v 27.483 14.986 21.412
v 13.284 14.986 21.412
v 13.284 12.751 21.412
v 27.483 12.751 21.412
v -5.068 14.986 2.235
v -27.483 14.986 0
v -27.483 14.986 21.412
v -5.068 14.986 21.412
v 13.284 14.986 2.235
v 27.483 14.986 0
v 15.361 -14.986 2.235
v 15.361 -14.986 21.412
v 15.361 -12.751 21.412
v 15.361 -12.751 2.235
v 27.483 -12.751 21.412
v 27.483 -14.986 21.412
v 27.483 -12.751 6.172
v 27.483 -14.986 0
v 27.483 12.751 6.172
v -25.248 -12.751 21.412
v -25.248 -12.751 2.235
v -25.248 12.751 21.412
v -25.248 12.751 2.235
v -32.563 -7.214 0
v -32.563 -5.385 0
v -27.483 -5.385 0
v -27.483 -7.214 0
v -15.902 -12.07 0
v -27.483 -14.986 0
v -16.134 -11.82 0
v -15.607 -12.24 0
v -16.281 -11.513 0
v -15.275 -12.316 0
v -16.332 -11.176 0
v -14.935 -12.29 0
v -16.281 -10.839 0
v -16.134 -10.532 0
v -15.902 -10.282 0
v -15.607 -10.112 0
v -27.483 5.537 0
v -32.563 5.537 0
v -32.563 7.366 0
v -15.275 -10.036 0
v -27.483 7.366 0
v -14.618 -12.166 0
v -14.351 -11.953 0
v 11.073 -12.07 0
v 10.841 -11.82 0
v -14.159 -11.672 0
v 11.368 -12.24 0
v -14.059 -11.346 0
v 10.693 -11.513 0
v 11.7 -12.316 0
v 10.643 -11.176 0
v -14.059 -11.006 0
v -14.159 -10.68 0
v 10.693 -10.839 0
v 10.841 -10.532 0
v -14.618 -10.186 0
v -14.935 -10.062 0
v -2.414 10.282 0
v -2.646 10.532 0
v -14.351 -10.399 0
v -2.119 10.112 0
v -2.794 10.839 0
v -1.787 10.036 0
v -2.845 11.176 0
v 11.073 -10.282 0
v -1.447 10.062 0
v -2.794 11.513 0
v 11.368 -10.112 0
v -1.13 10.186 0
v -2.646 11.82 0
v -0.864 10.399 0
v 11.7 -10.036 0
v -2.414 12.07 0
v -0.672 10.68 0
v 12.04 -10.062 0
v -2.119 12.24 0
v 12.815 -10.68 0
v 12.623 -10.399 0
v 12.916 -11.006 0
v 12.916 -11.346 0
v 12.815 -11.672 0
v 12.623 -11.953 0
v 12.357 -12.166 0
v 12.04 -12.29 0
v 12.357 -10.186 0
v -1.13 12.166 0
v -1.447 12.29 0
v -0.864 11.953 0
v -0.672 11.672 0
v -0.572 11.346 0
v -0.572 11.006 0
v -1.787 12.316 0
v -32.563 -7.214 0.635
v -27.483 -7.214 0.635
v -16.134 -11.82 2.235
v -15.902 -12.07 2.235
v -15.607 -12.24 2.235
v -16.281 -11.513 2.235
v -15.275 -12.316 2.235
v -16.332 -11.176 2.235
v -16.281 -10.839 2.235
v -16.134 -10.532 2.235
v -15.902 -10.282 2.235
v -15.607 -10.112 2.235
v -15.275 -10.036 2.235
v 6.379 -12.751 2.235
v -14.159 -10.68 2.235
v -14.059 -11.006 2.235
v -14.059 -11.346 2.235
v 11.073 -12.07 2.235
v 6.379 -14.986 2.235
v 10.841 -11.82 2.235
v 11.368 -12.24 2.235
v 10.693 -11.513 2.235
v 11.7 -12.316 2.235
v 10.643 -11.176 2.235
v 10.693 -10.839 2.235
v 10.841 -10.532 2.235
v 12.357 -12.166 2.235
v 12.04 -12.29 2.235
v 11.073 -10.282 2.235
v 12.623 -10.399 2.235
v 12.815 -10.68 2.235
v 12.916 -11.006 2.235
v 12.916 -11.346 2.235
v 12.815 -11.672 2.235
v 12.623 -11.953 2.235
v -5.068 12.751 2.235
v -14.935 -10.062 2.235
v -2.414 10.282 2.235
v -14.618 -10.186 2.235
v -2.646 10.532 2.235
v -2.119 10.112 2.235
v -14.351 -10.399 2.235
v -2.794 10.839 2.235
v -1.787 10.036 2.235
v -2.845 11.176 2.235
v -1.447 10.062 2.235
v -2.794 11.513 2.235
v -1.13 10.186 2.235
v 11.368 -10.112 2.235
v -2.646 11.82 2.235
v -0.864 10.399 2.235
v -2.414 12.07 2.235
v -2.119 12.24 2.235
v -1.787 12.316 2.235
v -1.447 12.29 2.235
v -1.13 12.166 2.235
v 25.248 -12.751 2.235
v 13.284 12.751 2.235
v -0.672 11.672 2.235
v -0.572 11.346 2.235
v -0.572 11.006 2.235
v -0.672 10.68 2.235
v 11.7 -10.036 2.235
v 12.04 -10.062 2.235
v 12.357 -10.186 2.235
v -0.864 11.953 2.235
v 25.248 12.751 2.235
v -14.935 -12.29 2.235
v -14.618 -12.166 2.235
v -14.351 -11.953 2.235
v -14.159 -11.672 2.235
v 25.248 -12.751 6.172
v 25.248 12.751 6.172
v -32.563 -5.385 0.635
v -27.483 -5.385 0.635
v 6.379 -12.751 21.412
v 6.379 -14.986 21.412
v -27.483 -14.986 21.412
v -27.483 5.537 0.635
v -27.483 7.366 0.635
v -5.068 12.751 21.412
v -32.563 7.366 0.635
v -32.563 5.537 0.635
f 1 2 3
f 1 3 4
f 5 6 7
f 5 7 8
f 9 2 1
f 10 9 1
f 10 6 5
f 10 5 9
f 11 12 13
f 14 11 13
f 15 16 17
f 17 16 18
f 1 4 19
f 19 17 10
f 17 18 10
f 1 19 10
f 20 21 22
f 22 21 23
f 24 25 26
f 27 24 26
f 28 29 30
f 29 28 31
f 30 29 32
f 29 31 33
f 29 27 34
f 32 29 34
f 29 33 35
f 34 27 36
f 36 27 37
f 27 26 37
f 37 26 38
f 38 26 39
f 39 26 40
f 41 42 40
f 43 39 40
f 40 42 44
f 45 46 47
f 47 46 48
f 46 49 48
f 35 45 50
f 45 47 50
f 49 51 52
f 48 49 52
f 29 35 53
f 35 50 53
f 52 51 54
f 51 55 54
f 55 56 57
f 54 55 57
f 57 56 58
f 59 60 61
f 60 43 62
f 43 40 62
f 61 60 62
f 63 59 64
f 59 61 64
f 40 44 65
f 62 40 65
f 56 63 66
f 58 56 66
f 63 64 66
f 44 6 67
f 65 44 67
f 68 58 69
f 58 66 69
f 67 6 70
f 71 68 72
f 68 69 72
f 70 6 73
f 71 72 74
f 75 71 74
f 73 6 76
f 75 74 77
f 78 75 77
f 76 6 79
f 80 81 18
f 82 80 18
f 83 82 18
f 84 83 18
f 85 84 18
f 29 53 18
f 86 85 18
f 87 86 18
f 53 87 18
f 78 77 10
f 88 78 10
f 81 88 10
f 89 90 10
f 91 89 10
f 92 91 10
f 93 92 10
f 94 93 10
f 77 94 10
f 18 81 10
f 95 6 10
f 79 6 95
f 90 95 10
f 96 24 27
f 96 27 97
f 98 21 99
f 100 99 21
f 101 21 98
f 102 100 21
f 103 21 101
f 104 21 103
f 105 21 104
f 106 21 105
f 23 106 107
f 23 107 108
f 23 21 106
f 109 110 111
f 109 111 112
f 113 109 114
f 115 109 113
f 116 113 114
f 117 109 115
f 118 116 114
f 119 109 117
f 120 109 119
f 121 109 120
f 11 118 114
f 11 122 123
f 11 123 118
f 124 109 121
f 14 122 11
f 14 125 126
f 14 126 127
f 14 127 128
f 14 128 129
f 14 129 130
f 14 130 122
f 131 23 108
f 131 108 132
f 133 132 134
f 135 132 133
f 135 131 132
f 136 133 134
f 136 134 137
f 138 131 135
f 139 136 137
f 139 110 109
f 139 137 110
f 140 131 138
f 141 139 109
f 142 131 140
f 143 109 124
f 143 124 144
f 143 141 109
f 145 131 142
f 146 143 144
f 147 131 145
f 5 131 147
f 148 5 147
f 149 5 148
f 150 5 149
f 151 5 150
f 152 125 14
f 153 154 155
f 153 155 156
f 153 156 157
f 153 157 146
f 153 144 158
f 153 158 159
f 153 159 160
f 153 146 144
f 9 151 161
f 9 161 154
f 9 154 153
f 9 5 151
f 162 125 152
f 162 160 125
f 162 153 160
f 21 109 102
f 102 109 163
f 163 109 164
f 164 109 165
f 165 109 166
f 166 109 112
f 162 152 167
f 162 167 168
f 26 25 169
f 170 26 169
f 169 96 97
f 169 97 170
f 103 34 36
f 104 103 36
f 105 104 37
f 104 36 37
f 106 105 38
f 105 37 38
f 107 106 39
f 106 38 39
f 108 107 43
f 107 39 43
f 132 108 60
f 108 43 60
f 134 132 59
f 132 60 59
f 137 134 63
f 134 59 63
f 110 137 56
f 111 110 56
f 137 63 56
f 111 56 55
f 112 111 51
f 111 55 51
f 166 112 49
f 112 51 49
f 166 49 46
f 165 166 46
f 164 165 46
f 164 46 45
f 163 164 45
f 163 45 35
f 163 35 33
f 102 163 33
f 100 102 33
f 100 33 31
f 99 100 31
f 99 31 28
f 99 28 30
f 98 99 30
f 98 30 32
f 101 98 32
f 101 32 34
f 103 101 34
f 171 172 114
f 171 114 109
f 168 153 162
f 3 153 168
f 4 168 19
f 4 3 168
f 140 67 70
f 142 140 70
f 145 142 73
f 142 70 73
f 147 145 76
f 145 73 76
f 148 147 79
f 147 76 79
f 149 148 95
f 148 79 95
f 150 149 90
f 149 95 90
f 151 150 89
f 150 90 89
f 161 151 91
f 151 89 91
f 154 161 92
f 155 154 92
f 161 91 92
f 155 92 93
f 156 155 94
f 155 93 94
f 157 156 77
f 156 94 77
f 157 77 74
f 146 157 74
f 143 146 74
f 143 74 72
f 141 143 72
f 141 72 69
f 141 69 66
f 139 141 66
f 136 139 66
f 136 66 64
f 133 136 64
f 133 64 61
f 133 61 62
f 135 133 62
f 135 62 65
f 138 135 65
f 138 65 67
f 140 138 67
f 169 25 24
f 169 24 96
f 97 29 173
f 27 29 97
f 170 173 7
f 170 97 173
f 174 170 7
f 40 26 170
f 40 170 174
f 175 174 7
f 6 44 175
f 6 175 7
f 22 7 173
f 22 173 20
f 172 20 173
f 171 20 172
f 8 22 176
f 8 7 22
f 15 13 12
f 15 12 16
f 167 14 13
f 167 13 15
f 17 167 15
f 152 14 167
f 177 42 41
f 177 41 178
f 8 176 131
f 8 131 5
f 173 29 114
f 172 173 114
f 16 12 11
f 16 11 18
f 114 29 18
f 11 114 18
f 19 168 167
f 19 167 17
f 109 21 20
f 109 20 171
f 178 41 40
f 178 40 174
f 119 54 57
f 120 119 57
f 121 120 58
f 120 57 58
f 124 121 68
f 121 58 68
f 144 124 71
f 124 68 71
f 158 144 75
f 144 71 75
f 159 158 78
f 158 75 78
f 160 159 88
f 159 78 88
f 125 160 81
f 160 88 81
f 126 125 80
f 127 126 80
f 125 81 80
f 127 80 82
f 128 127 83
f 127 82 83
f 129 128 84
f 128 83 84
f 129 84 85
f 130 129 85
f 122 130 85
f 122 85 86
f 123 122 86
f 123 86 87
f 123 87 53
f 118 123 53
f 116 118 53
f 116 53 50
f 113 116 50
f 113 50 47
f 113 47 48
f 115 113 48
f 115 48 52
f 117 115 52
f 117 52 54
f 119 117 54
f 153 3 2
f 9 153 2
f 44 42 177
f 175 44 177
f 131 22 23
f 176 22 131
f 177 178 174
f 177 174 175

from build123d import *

# Parameters (mm, degrees)
SKETCH1_W           = 54.9656
SKETCH1_H           = 29.972
BOSS_EXTRUDE1_DEPTH = 21.4122
SHELL1_T            = -2.2352
SKETCH2_R           = 1.143
CUT_EXTRUDE1_DEPTH  = 38.925806526
SKETCH3_W           = 2.2352
SKETCH3_H           = 25.5016
CUT_EXTRUDE2_DEPTH  = 15.24
SKETCH4_W           = 8.981533828
SKETCH4_H           = 2.2352
SKETCH4_W_2         = 18.352338923
CUT_EXTRUDE3_DEPTH  = 19.177
SKETCH6_W           = 0.635
SKETCH6_H           = 1.8288
BOSS_EXTRUDE2_DEPTH = 5.08


with BuildPart() as part:
    # Sketch1 → Boss-Extrude1 (new body)
    with BuildSketch(Plane.XY):
        Rectangle(SKETCH1_W, SKETCH1_H)
    extrude(amount=BOSS_EXTRUDE1_DEPTH)

    # Shell1
    shell1_openings = [part.faces().sort_by_distance(p)[0] for p in [
        (0, 0, 21.4122),
    ]]
    offset(amount=SHELL1_T, openings=shell1_openings, kind=Kind.INTERSECTION)

    # Sketch2 → Cut-Extrude1 (cut, through all)
    with BuildSketch(Plane(origin=(0, 0, 0), x_dir=(-1, 0, 0), z_dir=(0, 0, -1))):
        with Locations((1.7018, 11.176)):
            Circle(SKETCH2_R)
        with Locations((-11.7856, -11.176)):
            Circle(SKETCH2_R)
        with Locations((15.1892, -11.176)):
            Circle(SKETCH2_R)
    extrude(amount=-CUT_EXTRUDE1_DEPTH, mode=Mode.SUBTRACT)

    # Sketch3 → Cut-Extrude2 (cut)
    with BuildSketch(Plane.XY.offset(21.4122)):
        with Locations((26.3652, 0)):
            Rectangle(SKETCH3_W, SKETCH3_H)
    extrude(amount=-CUT_EXTRUDE2_DEPTH, mode=Mode.SUBTRACT)

    # Sketch4 → Cut-Extrude3 (cut)
    with BuildSketch(Plane.XY.offset(21.4122)):
        with Locations((10.870255505, -13.8684)):
            Rectangle(SKETCH4_W, SKETCH4_H)
        with Locations((4.107846369, 13.8684)):
            Rectangle(SKETCH4_W_2, SKETCH4_H)
    extrude(amount=-CUT_EXTRUDE3_DEPTH, mode=Mode.SUBTRACT)

    # Sketch6 → Boss-Extrude2 (add)
    with BuildSketch(Plane.ZY.offset(27.4828)):
        with Locations((0.3175, 6.4516)):
            Rectangle(SKETCH6_W, SKETCH6_H)
        with Locations((0.3175, -6.2992)):
            Rectangle(SKETCH6_W, SKETCH6_H)
    extrude(amount=BOSS_EXTRUDE2_DEPTH)


solid = part.part
